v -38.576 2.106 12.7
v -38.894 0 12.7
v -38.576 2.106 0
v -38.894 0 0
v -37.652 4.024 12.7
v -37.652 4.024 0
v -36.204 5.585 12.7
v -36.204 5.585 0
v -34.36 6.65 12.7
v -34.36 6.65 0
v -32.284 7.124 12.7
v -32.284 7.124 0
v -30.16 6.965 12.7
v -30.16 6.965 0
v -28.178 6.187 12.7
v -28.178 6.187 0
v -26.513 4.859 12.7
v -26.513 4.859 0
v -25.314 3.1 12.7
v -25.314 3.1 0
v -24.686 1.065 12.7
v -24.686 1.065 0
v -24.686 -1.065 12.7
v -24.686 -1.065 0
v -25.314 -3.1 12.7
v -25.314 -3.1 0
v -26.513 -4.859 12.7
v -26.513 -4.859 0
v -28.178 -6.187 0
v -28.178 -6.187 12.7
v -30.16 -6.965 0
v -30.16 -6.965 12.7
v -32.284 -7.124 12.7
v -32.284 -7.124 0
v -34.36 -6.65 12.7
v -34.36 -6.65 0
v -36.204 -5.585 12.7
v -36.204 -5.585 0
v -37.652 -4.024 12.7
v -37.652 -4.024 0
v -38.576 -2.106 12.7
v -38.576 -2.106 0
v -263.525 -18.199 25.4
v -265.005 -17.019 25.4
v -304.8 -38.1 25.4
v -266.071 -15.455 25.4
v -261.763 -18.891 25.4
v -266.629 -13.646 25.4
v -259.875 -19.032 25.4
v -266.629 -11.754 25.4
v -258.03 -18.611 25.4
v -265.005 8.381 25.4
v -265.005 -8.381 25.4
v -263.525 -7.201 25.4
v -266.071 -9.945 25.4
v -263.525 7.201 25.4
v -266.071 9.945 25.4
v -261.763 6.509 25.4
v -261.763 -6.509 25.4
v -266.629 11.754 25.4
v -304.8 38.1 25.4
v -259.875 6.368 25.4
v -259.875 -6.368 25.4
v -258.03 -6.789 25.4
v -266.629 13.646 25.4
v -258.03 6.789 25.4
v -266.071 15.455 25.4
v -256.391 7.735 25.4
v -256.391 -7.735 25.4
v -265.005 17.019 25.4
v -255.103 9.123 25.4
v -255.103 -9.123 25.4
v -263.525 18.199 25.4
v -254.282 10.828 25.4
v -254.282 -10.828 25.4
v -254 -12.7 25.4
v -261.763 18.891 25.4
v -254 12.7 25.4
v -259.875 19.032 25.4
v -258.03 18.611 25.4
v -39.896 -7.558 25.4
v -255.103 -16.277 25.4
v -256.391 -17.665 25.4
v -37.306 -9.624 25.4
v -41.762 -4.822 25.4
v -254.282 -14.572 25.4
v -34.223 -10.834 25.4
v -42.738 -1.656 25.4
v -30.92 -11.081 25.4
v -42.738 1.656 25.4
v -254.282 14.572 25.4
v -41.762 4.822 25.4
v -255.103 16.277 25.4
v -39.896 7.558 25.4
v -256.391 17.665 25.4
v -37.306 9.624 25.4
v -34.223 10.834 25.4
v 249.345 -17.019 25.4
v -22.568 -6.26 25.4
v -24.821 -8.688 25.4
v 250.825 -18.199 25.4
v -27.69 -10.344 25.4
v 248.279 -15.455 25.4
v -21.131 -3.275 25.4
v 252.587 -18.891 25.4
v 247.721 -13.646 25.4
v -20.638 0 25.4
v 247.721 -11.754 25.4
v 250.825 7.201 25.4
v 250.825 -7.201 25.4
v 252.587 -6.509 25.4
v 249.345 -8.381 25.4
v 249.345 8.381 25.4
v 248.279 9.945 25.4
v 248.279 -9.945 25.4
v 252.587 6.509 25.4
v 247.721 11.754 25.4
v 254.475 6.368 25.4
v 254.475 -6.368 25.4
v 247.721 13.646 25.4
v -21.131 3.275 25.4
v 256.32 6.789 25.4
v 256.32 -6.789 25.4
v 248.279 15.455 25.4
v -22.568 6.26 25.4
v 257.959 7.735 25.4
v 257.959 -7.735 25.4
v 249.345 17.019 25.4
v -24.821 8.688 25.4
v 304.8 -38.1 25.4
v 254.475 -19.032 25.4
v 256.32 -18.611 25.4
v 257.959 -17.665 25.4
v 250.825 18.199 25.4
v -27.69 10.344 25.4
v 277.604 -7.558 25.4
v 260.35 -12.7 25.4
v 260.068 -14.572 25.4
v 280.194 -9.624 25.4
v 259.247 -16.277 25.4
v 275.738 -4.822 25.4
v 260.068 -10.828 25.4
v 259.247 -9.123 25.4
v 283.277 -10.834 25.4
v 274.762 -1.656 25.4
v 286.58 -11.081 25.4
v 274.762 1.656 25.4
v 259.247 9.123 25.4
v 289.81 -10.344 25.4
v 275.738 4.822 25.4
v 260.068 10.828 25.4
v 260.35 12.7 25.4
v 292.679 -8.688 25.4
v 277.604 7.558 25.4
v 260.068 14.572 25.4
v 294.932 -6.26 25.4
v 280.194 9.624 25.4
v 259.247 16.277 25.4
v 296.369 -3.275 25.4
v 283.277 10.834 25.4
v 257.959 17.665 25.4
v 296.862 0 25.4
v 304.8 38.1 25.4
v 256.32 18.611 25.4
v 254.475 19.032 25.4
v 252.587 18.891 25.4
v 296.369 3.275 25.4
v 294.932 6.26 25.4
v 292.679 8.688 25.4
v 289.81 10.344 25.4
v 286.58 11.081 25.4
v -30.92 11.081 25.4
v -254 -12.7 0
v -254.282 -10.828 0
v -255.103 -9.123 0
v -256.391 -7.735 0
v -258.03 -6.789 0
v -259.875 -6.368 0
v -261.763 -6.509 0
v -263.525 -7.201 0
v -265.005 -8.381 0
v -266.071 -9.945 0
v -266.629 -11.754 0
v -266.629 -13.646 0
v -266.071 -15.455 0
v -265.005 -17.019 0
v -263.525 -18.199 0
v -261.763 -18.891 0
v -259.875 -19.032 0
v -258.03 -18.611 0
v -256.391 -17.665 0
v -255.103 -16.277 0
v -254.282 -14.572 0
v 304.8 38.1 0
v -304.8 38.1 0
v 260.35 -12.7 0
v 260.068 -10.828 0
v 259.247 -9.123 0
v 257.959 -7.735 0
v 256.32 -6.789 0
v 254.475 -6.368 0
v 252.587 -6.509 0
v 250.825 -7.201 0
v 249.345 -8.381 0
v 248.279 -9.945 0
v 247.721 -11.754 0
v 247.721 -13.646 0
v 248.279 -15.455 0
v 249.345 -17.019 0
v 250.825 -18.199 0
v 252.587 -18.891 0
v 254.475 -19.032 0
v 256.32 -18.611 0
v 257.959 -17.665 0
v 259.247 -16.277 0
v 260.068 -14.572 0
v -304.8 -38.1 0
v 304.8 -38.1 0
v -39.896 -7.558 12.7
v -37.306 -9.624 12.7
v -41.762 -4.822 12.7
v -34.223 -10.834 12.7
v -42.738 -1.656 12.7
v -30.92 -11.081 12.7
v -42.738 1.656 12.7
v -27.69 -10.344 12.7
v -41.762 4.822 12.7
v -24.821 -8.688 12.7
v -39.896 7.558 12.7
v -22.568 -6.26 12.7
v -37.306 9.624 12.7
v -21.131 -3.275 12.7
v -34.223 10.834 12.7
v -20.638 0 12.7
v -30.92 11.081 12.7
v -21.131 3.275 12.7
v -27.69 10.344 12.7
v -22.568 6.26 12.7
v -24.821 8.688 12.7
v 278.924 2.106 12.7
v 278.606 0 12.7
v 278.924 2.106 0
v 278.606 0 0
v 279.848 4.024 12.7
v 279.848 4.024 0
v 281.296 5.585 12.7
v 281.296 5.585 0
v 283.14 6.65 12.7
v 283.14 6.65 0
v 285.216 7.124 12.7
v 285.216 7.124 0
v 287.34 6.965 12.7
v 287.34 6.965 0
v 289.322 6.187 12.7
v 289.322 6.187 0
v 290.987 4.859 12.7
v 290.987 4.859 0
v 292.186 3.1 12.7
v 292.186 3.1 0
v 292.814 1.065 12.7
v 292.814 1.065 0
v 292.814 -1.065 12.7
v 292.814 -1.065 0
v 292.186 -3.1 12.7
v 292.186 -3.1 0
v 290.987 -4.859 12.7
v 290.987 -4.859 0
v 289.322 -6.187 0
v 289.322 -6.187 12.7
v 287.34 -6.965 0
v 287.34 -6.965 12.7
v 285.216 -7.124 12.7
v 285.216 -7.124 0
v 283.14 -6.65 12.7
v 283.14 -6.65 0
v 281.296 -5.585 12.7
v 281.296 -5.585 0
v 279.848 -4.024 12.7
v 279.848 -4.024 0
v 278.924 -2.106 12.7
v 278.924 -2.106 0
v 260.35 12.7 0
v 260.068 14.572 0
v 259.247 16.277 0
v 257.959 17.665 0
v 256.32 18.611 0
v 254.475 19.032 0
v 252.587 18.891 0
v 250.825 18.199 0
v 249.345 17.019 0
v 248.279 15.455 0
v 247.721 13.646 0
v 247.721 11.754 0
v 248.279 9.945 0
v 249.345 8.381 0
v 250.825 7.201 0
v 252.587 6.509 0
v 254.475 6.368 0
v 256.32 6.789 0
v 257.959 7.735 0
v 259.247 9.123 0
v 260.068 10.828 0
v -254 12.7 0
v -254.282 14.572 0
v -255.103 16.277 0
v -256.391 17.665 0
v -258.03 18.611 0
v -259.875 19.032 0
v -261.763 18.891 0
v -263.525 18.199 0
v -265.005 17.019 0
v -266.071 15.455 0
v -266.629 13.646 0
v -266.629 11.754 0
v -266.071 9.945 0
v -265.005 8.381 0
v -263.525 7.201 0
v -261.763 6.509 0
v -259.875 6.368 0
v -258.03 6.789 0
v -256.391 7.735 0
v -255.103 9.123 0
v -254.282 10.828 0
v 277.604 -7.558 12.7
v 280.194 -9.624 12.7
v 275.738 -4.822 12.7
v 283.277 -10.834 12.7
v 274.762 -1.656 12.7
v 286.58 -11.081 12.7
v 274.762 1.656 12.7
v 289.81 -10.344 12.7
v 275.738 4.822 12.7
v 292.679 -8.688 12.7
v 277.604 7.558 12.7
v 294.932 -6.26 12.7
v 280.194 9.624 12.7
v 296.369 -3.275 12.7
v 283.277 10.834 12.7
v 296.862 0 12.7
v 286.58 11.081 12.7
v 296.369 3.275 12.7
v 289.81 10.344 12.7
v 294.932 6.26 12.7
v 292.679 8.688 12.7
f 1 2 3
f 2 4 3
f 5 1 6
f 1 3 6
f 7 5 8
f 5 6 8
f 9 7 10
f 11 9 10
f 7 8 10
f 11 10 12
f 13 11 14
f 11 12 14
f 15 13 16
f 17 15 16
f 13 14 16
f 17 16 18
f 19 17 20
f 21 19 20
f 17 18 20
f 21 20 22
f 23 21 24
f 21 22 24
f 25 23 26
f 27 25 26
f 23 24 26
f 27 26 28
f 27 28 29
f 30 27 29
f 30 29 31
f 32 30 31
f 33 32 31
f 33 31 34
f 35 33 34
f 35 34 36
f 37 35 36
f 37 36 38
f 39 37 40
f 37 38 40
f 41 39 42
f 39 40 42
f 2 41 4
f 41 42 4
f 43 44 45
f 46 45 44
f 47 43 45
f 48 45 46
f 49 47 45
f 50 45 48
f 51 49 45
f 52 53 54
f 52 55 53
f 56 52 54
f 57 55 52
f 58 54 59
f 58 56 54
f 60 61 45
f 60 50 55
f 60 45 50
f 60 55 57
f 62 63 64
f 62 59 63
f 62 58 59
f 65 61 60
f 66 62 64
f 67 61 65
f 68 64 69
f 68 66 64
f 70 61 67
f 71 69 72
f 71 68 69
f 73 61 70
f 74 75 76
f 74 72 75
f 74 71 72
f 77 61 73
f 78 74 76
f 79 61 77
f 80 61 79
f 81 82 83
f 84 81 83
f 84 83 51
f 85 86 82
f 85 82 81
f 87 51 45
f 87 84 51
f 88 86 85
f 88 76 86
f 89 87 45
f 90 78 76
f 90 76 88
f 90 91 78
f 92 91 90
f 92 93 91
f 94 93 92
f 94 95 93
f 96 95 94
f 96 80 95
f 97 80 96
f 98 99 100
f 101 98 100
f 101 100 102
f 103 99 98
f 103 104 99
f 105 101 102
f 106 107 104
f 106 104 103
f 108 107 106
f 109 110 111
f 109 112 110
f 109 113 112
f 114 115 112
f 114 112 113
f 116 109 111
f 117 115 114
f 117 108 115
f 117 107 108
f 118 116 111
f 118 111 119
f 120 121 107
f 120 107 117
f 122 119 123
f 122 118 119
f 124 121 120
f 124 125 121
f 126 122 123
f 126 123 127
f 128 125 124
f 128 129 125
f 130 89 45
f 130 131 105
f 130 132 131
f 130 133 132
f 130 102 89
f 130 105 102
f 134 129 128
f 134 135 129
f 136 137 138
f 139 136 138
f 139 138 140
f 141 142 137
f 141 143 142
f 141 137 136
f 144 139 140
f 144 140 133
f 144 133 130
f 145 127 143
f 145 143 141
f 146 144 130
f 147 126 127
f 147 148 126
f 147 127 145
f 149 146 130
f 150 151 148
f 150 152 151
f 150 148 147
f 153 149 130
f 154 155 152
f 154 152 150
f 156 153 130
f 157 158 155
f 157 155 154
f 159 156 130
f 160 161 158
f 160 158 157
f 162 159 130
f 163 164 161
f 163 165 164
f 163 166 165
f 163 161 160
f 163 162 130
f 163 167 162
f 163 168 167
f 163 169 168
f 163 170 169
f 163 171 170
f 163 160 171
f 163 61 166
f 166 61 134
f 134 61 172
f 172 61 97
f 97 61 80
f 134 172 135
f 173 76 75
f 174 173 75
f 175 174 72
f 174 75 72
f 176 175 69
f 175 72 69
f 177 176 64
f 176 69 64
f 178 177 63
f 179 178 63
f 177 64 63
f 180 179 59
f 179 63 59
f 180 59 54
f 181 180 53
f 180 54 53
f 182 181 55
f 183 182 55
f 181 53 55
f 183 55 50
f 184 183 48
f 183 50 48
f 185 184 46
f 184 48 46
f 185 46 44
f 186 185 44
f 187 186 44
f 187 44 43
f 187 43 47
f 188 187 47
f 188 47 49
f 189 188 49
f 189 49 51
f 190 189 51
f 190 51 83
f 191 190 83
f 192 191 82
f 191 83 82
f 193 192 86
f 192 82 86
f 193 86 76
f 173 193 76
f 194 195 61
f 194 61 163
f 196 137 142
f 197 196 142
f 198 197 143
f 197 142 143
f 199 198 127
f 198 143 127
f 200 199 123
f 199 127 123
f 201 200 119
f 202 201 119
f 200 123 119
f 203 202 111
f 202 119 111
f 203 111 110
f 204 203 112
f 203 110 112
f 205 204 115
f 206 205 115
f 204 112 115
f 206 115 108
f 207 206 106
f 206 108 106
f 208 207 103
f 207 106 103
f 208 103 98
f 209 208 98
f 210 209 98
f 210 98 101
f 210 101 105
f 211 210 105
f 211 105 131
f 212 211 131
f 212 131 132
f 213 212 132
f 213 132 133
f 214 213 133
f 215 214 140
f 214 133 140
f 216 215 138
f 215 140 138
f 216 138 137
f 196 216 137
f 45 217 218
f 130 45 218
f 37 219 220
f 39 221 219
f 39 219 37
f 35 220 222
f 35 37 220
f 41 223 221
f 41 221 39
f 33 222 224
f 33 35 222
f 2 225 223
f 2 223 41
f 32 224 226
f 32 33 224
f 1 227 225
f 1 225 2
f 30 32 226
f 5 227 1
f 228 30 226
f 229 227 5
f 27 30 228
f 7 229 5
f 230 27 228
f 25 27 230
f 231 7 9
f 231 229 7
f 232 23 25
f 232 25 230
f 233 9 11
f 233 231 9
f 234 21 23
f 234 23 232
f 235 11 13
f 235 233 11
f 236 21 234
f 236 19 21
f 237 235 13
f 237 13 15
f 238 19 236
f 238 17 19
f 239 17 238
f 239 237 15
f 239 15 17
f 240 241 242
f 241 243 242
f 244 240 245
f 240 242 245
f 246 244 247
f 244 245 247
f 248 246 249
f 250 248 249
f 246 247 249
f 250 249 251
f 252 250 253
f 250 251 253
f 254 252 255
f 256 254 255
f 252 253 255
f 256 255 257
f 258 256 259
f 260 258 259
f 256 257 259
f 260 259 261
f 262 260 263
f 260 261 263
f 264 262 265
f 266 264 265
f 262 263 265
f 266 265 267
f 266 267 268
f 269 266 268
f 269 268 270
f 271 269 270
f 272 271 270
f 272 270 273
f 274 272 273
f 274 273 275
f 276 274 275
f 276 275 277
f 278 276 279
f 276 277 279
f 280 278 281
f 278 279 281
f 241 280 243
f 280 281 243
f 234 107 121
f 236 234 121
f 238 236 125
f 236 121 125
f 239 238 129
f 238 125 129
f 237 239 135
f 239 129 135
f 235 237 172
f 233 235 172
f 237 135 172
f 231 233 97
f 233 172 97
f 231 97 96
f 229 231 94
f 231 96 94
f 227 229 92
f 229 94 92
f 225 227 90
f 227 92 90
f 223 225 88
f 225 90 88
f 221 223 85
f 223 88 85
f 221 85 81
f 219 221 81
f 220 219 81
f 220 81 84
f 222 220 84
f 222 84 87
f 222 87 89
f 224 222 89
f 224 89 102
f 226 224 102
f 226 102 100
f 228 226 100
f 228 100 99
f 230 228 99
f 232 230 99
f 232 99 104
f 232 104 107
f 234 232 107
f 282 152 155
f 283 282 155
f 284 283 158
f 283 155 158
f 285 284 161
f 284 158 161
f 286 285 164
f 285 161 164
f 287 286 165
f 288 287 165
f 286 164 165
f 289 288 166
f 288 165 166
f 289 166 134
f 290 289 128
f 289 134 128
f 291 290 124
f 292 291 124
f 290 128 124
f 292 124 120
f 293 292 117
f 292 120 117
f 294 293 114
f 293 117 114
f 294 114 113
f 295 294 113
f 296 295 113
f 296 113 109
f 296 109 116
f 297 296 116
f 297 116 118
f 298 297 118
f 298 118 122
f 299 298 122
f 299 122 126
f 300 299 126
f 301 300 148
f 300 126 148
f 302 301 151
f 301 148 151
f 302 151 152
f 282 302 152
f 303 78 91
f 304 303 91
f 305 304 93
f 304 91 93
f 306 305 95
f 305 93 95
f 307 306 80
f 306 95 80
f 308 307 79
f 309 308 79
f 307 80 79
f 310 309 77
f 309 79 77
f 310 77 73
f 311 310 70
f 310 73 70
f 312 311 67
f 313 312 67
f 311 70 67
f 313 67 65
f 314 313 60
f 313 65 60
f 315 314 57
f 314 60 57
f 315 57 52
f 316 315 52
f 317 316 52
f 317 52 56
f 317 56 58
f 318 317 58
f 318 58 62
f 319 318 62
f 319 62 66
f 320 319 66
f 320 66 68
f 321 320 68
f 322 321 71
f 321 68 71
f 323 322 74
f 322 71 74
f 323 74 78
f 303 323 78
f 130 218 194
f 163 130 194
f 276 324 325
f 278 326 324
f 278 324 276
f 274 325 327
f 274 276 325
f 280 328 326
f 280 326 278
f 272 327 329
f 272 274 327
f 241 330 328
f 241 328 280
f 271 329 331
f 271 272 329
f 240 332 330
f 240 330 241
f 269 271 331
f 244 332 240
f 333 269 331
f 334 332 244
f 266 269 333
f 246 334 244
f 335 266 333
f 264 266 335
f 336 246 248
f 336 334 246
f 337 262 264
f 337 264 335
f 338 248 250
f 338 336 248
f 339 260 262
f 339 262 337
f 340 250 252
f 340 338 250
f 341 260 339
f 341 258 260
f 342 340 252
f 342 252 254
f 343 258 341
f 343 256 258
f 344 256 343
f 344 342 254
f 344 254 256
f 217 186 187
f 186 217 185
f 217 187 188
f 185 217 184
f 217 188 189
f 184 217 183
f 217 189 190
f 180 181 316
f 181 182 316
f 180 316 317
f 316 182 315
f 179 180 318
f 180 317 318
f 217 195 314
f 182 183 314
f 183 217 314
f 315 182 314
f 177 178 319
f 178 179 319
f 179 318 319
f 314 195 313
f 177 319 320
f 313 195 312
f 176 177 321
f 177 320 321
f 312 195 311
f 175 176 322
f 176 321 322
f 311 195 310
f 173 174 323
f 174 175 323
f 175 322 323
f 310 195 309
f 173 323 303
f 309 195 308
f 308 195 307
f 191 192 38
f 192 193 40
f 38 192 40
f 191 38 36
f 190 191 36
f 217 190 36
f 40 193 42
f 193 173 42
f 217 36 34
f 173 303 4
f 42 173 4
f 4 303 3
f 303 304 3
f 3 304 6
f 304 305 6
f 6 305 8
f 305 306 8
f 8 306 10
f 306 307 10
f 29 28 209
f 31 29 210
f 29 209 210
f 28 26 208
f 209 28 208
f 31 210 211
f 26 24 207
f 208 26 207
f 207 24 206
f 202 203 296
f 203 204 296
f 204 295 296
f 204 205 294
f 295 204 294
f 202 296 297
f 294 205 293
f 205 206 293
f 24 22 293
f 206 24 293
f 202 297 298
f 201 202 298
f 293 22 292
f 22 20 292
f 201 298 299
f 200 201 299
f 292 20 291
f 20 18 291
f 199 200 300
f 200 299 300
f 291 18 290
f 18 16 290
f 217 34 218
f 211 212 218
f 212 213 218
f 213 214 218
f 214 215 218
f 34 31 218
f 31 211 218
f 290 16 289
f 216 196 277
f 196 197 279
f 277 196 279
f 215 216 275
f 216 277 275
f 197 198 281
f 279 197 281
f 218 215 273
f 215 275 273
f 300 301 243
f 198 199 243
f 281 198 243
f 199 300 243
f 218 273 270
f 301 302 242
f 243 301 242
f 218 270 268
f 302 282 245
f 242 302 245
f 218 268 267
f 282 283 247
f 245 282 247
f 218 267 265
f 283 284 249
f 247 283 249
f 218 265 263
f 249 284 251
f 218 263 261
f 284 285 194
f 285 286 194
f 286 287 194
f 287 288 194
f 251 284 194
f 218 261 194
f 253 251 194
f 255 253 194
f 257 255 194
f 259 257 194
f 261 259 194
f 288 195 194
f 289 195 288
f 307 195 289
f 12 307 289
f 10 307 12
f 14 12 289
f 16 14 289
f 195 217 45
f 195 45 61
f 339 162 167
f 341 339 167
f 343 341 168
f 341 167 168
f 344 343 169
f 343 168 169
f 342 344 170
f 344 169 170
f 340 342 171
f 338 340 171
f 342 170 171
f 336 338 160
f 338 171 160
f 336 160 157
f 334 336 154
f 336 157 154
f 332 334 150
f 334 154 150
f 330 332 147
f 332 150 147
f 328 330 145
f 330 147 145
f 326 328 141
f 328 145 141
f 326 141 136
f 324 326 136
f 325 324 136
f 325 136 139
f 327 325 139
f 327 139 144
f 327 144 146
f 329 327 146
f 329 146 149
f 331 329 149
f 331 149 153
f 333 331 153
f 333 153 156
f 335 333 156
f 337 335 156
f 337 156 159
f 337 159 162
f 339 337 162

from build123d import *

# Parameters (mm, degrees)
F0_W           = 609.6
F0_H           = 76.2
F1_DEPTH       = 25.4
F2_R           = 6.35
F3_DEPTH       = 25.4
F5_D           = 14.2875
F5_CBORE_D     = 22.225
F5_CBORE_DEPTH = 12.7


with BuildPart() as f1:
    # F0 (on Top) → F1 (new body)
    with BuildSketch(Plane.XY):
        Rectangle(F0_W, F0_H)
    extrude(amount=F1_DEPTH)

    # F2 (on face) → F3 (cut)
    with BuildSketch(Plane.XY.offset(25.4)):
        with Locations((254, -12.7)):
            Circle(F2_R)
        with Locations((254, 12.7)):
            Circle(F2_R)
        with Locations((-260.35, -12.7)):
            Circle(F2_R)
        with Locations((-260.35, 12.7)):
            Circle(F2_R)
    extrude(amount=-F3_DEPTH, mode=Mode.SUBTRACT)

    # F5 (through all)
    with Locations(Plane.XY.offset(25.4)):
        with Locations((-31.75, 0), (285.75, 0)):
            CounterBoreHole(F5_D / 2, F5_CBORE_D / 2, F5_CBORE_DEPTH)


solid = f1.part
